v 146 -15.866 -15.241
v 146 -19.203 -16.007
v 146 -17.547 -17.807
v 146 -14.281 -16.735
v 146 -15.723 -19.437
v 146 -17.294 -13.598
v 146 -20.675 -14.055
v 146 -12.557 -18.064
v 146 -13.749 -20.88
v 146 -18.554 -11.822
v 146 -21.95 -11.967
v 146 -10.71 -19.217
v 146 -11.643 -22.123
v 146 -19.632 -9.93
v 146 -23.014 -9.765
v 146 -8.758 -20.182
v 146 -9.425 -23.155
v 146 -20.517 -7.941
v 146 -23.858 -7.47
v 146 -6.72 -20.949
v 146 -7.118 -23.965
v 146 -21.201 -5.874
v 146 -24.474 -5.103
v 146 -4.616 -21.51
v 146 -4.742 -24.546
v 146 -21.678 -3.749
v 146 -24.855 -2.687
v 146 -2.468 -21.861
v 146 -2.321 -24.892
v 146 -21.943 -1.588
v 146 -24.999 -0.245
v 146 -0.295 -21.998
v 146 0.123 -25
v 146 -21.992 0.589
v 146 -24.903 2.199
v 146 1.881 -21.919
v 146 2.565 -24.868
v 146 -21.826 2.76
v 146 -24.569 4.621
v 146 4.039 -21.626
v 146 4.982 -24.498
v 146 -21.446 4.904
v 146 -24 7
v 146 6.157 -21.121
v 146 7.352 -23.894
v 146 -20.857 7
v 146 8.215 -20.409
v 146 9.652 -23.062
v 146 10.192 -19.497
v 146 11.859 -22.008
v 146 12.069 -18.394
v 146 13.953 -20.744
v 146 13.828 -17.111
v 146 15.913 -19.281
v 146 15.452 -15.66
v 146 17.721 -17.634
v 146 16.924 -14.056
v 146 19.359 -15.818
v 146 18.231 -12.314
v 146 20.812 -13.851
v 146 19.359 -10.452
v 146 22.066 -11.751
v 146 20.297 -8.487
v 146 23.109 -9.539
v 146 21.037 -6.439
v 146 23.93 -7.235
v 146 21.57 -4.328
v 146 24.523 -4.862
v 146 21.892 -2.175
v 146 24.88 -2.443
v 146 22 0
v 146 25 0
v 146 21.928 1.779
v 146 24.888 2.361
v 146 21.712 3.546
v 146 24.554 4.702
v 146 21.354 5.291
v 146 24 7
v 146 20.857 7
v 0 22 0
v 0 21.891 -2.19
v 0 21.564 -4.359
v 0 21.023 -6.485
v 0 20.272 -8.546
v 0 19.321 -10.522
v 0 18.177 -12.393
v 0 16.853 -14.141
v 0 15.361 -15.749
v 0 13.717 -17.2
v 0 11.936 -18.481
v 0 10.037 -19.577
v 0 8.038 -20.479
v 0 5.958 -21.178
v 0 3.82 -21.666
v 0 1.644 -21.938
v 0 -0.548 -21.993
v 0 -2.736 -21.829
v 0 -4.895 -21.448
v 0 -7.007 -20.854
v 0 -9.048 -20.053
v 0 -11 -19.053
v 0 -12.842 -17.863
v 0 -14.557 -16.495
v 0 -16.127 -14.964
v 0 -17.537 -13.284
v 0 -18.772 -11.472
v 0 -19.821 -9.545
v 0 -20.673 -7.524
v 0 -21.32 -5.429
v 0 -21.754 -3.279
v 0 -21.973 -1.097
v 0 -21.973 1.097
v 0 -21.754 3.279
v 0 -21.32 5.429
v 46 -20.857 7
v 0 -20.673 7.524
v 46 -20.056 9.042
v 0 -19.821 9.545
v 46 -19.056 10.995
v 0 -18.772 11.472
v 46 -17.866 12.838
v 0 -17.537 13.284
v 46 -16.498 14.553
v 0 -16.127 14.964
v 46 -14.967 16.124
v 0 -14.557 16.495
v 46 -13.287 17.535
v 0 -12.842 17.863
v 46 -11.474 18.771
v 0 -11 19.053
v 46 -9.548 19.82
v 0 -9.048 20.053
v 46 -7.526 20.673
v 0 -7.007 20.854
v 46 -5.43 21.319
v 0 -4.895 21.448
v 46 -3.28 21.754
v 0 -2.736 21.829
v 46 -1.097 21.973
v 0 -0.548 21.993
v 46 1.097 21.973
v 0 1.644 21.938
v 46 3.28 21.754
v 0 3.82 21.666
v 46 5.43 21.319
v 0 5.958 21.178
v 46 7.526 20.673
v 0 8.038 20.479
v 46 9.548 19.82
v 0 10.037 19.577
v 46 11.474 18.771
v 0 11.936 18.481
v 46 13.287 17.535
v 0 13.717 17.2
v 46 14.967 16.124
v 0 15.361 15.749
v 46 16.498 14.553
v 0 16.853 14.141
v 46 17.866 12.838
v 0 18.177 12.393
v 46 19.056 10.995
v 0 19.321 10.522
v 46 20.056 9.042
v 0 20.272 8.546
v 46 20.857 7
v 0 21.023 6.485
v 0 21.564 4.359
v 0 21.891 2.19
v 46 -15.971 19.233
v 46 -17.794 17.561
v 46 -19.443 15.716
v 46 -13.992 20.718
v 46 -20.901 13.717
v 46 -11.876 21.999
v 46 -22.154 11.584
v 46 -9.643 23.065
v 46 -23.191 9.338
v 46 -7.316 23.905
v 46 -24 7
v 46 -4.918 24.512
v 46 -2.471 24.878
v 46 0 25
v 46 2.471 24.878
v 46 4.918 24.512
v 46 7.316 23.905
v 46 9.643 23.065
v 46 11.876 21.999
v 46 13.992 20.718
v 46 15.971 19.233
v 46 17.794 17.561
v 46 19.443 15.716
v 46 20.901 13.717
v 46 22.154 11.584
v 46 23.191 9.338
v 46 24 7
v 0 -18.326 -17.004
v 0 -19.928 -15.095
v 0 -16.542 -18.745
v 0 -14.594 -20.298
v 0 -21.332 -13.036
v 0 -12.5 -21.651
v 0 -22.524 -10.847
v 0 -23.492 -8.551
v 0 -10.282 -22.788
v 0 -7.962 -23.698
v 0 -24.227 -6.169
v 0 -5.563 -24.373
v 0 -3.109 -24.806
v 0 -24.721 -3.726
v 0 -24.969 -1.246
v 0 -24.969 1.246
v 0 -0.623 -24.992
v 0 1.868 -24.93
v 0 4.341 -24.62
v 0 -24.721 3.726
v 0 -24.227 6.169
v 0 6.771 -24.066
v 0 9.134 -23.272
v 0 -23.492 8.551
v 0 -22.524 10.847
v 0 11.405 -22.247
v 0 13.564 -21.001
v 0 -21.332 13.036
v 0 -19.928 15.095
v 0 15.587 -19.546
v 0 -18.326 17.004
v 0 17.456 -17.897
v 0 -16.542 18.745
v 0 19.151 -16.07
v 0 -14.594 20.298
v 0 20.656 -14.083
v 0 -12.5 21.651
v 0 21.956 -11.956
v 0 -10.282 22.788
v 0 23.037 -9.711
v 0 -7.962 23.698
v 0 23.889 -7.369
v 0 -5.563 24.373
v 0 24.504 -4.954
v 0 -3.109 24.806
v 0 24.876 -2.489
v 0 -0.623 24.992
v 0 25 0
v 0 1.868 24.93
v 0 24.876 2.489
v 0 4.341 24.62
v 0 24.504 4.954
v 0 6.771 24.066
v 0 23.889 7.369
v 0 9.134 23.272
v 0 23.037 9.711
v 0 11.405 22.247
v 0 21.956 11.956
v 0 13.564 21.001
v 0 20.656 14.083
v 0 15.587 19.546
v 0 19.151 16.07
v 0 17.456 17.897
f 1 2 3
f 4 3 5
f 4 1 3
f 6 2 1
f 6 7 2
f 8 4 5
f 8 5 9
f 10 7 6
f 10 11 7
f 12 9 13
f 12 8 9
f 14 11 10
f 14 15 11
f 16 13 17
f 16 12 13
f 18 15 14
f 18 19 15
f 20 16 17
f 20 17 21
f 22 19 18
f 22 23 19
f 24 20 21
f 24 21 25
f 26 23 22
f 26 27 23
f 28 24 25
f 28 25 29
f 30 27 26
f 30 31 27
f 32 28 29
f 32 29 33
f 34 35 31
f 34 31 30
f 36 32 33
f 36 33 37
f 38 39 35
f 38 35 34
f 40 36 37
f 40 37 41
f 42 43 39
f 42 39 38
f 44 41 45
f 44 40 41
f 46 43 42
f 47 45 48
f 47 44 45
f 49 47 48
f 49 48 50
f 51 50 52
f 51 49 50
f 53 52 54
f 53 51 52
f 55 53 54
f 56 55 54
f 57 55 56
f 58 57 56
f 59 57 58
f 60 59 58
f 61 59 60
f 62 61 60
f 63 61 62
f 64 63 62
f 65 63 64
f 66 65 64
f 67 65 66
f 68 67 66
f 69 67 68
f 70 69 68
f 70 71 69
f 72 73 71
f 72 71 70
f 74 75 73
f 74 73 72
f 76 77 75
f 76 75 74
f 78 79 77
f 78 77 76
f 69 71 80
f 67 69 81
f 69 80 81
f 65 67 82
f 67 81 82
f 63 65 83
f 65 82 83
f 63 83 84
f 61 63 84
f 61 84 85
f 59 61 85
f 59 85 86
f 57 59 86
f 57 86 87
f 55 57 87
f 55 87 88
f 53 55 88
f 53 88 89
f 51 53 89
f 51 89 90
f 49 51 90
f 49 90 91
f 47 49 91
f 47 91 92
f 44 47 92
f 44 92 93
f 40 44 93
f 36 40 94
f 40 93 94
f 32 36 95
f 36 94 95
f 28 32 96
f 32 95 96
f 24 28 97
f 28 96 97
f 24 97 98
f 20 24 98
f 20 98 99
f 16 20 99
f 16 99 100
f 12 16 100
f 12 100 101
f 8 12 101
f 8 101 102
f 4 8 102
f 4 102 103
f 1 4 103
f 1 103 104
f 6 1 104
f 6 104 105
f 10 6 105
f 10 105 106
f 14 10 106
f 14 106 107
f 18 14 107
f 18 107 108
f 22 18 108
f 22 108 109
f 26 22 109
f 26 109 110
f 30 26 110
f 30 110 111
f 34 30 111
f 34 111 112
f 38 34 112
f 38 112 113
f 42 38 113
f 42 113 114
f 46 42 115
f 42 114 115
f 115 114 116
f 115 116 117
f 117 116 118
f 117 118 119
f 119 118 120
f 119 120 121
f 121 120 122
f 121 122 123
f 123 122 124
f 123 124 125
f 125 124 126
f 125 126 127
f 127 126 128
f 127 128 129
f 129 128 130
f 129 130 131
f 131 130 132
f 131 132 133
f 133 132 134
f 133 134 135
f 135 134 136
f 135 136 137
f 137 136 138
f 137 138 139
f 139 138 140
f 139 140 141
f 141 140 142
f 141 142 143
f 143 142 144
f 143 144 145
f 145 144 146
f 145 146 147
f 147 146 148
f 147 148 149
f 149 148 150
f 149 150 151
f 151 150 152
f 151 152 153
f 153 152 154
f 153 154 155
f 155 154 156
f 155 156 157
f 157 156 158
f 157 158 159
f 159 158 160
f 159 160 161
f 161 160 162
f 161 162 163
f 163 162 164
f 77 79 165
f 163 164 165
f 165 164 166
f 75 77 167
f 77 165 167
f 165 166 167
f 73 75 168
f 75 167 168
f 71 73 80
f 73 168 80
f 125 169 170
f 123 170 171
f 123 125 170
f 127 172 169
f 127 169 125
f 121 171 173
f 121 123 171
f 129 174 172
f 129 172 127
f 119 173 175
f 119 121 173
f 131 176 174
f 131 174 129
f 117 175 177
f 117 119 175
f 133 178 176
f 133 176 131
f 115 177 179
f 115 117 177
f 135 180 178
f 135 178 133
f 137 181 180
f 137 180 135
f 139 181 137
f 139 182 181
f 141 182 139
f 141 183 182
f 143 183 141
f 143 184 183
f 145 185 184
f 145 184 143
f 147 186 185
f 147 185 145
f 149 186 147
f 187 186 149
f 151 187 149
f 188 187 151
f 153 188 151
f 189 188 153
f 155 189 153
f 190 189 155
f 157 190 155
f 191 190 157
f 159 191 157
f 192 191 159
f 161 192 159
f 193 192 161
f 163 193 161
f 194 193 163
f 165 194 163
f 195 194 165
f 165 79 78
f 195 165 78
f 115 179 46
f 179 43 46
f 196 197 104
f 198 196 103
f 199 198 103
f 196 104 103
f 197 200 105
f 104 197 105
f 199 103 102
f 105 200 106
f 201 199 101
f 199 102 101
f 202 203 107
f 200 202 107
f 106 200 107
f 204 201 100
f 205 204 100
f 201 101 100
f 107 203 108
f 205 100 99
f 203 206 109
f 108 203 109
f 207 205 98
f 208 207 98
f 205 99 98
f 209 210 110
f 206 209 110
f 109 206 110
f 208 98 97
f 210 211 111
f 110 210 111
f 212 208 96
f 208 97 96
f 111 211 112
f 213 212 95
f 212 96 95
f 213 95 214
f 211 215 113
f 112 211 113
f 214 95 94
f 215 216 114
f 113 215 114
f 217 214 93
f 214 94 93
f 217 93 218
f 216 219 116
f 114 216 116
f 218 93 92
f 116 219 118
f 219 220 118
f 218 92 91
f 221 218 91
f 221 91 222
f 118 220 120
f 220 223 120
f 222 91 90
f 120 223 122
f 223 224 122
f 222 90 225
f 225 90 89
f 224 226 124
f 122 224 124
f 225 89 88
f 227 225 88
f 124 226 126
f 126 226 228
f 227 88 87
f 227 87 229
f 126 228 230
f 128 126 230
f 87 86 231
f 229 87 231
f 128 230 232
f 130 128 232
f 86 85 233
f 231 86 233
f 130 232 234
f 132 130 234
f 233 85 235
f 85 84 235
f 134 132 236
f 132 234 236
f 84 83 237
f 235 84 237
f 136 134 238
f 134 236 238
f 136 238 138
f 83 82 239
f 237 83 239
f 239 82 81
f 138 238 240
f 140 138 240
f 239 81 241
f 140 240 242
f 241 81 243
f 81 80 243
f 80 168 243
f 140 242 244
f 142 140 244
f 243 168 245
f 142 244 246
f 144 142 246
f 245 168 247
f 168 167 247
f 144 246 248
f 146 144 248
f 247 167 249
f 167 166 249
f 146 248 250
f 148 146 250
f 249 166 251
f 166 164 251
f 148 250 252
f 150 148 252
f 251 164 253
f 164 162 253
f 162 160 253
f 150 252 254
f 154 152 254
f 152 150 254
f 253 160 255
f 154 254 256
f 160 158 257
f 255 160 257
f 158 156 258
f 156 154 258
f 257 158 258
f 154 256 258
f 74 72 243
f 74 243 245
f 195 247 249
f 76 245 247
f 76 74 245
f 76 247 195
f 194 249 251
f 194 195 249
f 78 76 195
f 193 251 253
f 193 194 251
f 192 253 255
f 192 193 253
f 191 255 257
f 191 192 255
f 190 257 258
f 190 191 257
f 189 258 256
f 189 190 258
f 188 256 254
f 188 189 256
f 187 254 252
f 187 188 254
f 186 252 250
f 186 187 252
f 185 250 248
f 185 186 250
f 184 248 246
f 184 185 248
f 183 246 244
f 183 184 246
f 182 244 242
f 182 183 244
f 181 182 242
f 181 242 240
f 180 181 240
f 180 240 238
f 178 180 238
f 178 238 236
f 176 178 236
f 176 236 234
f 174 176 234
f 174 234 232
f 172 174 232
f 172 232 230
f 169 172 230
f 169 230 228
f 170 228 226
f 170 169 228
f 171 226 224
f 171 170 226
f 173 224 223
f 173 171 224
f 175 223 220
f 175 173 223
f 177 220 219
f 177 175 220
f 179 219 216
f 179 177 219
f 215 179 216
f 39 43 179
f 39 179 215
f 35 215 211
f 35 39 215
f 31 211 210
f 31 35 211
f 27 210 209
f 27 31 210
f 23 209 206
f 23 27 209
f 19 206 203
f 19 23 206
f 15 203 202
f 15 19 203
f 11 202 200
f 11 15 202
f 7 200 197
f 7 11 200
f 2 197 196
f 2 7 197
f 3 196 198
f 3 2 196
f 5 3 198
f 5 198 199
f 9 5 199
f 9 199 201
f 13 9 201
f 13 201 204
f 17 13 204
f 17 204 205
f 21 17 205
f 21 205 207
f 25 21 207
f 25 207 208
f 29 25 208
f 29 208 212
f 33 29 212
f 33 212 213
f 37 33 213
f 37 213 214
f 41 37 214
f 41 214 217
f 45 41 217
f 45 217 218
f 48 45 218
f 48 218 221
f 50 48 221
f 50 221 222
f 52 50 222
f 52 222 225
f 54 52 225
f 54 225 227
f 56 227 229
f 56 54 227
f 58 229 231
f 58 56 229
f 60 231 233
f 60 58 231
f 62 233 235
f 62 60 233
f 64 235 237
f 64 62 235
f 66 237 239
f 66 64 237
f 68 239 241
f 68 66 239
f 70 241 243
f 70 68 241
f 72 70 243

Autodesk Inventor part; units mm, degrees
ref_plane "YZ Plane" through (0, 0, 0) normal (1, 0, 0) x (0, 1, 0)
ref_plane "XZ Plane" through (0, 0, 0) normal (0, 1, 0) x (-1, 0, 0)
ref_plane "XY Plane" through (0, 0, 0) normal (0, 0, 1) x (1, 0, 0)
sketch "Esquisse1" plane through (0, 0, 0) normal (0, 0, 1) x (1, 0, 0)
  line L0 (0, 25) -> (146, 25)
  line L1 (146, 25) -> (146, 22)
  line L2 (146, 22) -> (0, 22)
  line L3 (0, 22) -> (0, 25)
  line L4 (-10.0826, 0) -> (43.679, 0)
  line L5 (-41.2991, 0) -> (177.2165, 0) projected
  line L6 (0, -5) -> (0, 30) projected
  point P0 (0, 0)
  dimension "d0" = 3
  dimension "d1" = 50
  dimension "d2" = 146
revolve "Révolution1" add sketch "Esquisse1" angle 360 about axis through (-10.0826, 0, 0) along (1, 0, 0)
sketch "Esquisse5" plane through (146, 0, 0) normal (1, 0, 0) x (0, 0, -1)
  line L0 (-35, 0) -> (35, 0) construction
  circle A0 centre (0, 0) radius 22 construction
  circle A1 centre (0, 0) radius 25 construction
  line L1 (-25, -21.6089) -> (-25, 34.5668) construction
  line L2 (-22, -18.8661) -> (-22, 30.8732) construction
  line L3 (-7, -26.0436) -> (-7, 26.1117) construction
  arc A2 (0, 22) -> (0, 22) centre (0, 0) ccw projected
  arc A3 (-7, 20.8567) -> (-7, -20.8567) centre (0, 0) ccw
  arc A4 (0, 25) -> (0, 25) centre (0, 0) ccw projected
  arc A5 (0, 25) -> (0, 25) centre (0, 0) ccw projected
  arc A6 (-7, 24) -> (-7, -24) centre (0, 0) ccw
  line L4 (-7, -24) -> (-7, -20.8567)
  line L5 (-7, 20.8567) -> (-7, 24)
  dimension "d31" = 15
extrude "Extrusion5" cut sketch "Esquisse5" against normal blind 100 contours A2 L4 A4 L5 picked at (-22.7161, 2.7828)
properties part number "S1702_tubeexterne" material "Plastique PMMA"
